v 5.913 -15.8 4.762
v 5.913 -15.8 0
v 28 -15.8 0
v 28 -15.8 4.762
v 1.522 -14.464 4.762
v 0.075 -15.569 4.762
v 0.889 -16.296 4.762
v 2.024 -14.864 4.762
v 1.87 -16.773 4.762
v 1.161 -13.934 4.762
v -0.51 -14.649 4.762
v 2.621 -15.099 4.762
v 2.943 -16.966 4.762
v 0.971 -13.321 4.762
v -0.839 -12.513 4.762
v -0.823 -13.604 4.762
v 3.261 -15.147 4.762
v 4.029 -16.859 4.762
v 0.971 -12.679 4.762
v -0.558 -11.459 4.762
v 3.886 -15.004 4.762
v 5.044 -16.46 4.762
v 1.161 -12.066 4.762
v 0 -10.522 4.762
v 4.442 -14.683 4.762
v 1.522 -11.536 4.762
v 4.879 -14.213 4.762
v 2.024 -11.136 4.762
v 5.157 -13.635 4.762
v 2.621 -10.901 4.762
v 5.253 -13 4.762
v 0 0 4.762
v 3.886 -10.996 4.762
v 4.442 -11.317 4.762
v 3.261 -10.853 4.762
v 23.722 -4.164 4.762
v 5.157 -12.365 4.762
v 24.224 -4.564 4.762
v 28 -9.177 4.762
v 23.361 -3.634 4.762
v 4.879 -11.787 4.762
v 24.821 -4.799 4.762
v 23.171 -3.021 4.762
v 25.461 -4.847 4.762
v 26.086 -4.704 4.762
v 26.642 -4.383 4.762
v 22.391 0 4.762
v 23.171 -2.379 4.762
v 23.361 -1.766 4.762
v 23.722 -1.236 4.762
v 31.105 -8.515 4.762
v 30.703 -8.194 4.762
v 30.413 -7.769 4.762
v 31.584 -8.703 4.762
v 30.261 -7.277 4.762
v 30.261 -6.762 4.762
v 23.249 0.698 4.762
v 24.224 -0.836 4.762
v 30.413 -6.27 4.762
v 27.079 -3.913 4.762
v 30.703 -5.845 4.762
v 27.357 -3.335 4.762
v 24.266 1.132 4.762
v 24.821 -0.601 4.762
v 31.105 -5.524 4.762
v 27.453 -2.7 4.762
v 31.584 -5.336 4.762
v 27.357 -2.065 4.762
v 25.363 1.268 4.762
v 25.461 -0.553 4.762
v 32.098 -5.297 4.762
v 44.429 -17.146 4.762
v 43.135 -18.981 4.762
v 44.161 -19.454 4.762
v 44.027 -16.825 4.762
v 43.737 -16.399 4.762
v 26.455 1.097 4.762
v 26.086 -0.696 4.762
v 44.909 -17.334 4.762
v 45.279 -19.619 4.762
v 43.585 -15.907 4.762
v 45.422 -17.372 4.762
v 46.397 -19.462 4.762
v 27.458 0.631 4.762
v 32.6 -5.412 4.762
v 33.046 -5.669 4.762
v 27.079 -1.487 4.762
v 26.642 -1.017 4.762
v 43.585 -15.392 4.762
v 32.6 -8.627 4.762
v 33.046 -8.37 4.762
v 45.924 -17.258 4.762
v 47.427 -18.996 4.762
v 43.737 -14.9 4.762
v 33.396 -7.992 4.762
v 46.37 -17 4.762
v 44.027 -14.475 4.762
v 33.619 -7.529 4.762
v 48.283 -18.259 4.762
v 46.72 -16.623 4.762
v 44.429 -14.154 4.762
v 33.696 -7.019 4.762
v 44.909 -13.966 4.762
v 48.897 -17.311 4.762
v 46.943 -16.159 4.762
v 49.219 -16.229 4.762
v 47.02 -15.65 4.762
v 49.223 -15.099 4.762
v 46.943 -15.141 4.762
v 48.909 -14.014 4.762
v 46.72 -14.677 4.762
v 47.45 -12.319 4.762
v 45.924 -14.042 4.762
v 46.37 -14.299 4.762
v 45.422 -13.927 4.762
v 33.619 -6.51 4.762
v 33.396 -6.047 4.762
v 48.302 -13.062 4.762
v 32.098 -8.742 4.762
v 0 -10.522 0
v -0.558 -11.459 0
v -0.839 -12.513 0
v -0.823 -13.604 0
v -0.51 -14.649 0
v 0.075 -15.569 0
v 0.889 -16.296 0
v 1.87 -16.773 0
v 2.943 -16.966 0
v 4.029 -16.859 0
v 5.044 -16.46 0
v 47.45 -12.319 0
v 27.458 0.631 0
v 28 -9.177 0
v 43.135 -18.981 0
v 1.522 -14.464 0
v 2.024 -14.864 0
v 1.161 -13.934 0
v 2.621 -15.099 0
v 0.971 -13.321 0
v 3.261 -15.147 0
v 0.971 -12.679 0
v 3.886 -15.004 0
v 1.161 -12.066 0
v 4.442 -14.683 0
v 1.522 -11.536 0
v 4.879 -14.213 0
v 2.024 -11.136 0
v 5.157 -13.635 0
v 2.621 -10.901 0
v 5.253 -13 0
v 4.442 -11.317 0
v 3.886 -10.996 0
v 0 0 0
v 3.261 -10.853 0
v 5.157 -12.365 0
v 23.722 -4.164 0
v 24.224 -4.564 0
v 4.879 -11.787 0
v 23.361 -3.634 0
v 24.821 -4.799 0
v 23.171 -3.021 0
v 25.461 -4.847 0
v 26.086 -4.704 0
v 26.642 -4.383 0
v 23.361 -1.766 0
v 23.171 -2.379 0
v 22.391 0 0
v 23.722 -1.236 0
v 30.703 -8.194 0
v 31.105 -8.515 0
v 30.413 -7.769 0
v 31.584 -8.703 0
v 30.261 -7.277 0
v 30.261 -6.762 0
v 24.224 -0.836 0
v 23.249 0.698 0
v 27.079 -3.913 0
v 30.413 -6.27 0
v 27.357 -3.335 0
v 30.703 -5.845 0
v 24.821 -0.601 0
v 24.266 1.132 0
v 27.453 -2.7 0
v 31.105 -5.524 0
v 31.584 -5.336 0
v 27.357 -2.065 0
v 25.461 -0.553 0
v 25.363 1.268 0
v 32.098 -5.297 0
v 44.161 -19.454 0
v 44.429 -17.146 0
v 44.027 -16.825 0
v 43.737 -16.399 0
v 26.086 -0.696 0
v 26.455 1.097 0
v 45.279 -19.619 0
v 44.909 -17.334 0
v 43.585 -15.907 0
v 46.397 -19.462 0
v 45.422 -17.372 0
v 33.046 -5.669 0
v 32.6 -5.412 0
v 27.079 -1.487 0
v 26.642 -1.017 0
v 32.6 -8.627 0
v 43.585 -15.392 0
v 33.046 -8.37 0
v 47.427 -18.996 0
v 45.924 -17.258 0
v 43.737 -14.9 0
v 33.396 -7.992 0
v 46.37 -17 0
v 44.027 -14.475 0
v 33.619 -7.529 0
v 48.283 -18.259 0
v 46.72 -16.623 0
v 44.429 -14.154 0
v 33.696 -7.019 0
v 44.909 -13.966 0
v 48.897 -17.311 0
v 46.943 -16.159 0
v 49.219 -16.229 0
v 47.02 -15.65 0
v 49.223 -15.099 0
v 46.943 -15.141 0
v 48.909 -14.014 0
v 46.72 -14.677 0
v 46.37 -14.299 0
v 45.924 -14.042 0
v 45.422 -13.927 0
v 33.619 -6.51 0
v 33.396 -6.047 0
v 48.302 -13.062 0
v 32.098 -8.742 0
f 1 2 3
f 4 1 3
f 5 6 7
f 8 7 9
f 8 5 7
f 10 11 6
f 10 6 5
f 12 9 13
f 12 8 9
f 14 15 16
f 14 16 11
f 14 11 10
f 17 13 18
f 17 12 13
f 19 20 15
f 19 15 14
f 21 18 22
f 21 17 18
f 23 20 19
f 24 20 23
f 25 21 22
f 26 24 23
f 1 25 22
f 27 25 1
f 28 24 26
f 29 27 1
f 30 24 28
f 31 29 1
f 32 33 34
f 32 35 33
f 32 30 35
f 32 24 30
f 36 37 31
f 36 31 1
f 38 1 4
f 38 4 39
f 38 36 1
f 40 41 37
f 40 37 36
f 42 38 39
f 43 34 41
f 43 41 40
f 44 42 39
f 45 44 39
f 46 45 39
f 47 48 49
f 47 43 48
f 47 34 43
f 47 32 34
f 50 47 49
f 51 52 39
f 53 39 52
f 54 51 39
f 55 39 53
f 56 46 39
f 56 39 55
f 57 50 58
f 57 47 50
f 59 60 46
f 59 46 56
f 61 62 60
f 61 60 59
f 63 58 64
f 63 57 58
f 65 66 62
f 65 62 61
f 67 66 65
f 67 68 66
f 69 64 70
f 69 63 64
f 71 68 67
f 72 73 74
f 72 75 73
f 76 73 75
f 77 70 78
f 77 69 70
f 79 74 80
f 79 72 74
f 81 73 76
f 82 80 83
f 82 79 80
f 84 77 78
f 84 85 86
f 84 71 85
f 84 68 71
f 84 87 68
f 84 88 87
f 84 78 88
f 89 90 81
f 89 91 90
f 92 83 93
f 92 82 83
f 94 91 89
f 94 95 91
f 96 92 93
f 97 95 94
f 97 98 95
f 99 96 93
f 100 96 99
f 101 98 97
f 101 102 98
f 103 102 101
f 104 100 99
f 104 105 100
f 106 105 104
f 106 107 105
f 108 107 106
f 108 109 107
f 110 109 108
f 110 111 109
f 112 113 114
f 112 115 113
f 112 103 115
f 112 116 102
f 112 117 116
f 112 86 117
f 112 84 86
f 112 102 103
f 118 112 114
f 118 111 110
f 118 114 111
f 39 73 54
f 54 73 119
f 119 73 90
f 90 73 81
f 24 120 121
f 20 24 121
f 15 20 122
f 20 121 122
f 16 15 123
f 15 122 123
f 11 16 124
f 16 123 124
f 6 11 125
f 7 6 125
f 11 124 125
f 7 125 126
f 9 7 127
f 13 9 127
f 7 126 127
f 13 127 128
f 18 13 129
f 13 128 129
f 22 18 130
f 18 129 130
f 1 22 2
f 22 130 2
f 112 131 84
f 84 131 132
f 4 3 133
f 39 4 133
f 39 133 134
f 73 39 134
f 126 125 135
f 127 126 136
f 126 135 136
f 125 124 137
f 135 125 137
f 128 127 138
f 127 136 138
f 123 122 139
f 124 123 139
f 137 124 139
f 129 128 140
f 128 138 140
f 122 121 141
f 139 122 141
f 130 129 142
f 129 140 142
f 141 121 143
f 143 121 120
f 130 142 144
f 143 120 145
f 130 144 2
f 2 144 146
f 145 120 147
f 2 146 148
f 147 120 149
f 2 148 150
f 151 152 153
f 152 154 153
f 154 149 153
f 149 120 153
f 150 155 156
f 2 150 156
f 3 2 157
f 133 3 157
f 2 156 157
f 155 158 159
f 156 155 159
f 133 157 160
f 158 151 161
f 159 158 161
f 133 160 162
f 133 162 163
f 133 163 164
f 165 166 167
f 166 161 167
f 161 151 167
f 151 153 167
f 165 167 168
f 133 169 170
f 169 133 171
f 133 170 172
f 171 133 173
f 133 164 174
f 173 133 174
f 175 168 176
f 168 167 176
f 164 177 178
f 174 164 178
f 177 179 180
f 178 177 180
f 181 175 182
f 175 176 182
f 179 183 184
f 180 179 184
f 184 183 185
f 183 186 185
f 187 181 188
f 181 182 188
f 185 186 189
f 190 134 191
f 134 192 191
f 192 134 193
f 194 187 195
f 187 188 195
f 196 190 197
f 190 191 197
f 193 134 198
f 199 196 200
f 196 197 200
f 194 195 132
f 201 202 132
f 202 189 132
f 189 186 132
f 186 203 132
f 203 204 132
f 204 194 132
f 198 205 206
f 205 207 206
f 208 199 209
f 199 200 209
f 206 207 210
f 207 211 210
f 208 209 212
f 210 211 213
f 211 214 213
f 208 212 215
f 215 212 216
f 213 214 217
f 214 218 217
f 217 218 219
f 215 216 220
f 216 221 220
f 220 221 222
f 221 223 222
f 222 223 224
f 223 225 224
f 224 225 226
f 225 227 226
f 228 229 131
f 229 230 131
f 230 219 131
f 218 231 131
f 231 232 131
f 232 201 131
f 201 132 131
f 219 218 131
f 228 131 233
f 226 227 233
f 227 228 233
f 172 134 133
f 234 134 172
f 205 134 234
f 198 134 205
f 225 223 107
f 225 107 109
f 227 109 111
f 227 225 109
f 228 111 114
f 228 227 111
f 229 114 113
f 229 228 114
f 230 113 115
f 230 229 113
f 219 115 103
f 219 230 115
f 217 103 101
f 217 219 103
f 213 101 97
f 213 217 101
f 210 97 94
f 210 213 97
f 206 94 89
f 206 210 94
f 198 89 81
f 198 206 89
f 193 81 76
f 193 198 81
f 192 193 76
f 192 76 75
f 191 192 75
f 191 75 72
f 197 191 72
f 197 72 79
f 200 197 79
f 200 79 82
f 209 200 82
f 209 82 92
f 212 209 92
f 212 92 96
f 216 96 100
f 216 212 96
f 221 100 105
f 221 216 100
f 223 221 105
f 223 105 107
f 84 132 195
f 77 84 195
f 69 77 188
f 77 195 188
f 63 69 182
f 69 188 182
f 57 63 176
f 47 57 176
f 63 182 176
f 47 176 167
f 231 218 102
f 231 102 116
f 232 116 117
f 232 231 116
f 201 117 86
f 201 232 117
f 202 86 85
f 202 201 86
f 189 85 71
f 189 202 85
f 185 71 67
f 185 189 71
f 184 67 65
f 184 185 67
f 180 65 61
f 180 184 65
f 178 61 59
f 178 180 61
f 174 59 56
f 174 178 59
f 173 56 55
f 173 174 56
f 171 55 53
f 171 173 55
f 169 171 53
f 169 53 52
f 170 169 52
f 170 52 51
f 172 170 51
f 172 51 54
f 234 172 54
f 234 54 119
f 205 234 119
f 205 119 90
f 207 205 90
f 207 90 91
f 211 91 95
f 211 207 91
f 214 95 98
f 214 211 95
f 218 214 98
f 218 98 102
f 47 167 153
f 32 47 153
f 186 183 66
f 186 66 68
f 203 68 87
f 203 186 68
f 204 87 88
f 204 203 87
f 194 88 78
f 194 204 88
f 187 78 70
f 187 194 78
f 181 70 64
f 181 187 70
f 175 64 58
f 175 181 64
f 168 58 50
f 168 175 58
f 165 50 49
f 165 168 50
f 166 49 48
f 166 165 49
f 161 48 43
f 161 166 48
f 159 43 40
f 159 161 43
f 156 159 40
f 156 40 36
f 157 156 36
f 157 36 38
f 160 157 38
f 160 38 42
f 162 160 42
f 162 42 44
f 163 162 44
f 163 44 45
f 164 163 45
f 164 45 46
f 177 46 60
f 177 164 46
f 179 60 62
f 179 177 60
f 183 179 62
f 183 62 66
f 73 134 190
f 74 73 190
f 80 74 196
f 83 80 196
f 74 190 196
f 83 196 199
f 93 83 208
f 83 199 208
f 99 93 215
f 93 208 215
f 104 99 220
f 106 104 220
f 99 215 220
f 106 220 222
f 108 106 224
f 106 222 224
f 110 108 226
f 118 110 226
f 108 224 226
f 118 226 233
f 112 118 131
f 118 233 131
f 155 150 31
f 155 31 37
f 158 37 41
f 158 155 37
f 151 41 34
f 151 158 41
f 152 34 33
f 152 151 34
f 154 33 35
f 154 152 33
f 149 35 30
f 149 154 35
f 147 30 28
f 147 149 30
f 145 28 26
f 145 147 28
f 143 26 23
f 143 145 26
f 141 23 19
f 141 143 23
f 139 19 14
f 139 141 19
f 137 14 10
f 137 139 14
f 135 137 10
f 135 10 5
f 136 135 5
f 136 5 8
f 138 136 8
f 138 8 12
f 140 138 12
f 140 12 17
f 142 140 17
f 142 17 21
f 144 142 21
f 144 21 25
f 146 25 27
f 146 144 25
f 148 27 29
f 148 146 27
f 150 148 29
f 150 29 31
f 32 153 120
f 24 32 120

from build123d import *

# Parameters (mm, degrees)
F0_R     = 2.15265
F0_R_2   = 1.7272
F1_DEPTH = 4.7625


# Not quite as in the source:
# - a feature names something its author has since deleted; it is built from what else it names


with BuildPart() as f1:
    # F0 (on Top) → F1 (new body)
    with BuildSketch(Plane.XY):
        with BuildLine():
            Line((22.3912242158, 0), (0, 0))
            Line((0, 0), (0, -10.5219006149))
            ThreePointArc((0, -10.5219006149), (0.4570421145, -15.9607009606), (5.9126458296, -15.8))
            Line((5.9126458296, -15.8), (28, -15.8))
            Line((28, -15.8), (28, -9.1773860778))
            Line((28, -9.1773860778), (43.1353352142, -18.980828941))
            ThreePointArc((43.1353352142, -18.980828941), (48.6239542062, -17.8073662506), (47.4504915157, -12.3187472586))
            Line((47.4504915157, -12.3187472586), (27.4575781507, 0.6310408412))
            ThreePointArc((27.4575781507, 0.6310408412), (24.809461921, 1.2383180364), (22.3912242158, 0))
        make_face()
        with Locations((3.1, -13)):
            Circle(F0_R, mode=Mode.SUBTRACT)
        with Locations((45.2929133649, -15.6497880998)):
            Circle(F0_R_2, mode=Mode.SUBTRACT)
        with Locations((31.96875, -7.0194754969)):
            Circle(F0_R_2, mode=Mode.SUBTRACT)
        with Locations((25.3, -2.7)):
            Circle(F0_R, mode=Mode.SUBTRACT)
    extrude(amount=F1_DEPTH)


solid = f1.part
